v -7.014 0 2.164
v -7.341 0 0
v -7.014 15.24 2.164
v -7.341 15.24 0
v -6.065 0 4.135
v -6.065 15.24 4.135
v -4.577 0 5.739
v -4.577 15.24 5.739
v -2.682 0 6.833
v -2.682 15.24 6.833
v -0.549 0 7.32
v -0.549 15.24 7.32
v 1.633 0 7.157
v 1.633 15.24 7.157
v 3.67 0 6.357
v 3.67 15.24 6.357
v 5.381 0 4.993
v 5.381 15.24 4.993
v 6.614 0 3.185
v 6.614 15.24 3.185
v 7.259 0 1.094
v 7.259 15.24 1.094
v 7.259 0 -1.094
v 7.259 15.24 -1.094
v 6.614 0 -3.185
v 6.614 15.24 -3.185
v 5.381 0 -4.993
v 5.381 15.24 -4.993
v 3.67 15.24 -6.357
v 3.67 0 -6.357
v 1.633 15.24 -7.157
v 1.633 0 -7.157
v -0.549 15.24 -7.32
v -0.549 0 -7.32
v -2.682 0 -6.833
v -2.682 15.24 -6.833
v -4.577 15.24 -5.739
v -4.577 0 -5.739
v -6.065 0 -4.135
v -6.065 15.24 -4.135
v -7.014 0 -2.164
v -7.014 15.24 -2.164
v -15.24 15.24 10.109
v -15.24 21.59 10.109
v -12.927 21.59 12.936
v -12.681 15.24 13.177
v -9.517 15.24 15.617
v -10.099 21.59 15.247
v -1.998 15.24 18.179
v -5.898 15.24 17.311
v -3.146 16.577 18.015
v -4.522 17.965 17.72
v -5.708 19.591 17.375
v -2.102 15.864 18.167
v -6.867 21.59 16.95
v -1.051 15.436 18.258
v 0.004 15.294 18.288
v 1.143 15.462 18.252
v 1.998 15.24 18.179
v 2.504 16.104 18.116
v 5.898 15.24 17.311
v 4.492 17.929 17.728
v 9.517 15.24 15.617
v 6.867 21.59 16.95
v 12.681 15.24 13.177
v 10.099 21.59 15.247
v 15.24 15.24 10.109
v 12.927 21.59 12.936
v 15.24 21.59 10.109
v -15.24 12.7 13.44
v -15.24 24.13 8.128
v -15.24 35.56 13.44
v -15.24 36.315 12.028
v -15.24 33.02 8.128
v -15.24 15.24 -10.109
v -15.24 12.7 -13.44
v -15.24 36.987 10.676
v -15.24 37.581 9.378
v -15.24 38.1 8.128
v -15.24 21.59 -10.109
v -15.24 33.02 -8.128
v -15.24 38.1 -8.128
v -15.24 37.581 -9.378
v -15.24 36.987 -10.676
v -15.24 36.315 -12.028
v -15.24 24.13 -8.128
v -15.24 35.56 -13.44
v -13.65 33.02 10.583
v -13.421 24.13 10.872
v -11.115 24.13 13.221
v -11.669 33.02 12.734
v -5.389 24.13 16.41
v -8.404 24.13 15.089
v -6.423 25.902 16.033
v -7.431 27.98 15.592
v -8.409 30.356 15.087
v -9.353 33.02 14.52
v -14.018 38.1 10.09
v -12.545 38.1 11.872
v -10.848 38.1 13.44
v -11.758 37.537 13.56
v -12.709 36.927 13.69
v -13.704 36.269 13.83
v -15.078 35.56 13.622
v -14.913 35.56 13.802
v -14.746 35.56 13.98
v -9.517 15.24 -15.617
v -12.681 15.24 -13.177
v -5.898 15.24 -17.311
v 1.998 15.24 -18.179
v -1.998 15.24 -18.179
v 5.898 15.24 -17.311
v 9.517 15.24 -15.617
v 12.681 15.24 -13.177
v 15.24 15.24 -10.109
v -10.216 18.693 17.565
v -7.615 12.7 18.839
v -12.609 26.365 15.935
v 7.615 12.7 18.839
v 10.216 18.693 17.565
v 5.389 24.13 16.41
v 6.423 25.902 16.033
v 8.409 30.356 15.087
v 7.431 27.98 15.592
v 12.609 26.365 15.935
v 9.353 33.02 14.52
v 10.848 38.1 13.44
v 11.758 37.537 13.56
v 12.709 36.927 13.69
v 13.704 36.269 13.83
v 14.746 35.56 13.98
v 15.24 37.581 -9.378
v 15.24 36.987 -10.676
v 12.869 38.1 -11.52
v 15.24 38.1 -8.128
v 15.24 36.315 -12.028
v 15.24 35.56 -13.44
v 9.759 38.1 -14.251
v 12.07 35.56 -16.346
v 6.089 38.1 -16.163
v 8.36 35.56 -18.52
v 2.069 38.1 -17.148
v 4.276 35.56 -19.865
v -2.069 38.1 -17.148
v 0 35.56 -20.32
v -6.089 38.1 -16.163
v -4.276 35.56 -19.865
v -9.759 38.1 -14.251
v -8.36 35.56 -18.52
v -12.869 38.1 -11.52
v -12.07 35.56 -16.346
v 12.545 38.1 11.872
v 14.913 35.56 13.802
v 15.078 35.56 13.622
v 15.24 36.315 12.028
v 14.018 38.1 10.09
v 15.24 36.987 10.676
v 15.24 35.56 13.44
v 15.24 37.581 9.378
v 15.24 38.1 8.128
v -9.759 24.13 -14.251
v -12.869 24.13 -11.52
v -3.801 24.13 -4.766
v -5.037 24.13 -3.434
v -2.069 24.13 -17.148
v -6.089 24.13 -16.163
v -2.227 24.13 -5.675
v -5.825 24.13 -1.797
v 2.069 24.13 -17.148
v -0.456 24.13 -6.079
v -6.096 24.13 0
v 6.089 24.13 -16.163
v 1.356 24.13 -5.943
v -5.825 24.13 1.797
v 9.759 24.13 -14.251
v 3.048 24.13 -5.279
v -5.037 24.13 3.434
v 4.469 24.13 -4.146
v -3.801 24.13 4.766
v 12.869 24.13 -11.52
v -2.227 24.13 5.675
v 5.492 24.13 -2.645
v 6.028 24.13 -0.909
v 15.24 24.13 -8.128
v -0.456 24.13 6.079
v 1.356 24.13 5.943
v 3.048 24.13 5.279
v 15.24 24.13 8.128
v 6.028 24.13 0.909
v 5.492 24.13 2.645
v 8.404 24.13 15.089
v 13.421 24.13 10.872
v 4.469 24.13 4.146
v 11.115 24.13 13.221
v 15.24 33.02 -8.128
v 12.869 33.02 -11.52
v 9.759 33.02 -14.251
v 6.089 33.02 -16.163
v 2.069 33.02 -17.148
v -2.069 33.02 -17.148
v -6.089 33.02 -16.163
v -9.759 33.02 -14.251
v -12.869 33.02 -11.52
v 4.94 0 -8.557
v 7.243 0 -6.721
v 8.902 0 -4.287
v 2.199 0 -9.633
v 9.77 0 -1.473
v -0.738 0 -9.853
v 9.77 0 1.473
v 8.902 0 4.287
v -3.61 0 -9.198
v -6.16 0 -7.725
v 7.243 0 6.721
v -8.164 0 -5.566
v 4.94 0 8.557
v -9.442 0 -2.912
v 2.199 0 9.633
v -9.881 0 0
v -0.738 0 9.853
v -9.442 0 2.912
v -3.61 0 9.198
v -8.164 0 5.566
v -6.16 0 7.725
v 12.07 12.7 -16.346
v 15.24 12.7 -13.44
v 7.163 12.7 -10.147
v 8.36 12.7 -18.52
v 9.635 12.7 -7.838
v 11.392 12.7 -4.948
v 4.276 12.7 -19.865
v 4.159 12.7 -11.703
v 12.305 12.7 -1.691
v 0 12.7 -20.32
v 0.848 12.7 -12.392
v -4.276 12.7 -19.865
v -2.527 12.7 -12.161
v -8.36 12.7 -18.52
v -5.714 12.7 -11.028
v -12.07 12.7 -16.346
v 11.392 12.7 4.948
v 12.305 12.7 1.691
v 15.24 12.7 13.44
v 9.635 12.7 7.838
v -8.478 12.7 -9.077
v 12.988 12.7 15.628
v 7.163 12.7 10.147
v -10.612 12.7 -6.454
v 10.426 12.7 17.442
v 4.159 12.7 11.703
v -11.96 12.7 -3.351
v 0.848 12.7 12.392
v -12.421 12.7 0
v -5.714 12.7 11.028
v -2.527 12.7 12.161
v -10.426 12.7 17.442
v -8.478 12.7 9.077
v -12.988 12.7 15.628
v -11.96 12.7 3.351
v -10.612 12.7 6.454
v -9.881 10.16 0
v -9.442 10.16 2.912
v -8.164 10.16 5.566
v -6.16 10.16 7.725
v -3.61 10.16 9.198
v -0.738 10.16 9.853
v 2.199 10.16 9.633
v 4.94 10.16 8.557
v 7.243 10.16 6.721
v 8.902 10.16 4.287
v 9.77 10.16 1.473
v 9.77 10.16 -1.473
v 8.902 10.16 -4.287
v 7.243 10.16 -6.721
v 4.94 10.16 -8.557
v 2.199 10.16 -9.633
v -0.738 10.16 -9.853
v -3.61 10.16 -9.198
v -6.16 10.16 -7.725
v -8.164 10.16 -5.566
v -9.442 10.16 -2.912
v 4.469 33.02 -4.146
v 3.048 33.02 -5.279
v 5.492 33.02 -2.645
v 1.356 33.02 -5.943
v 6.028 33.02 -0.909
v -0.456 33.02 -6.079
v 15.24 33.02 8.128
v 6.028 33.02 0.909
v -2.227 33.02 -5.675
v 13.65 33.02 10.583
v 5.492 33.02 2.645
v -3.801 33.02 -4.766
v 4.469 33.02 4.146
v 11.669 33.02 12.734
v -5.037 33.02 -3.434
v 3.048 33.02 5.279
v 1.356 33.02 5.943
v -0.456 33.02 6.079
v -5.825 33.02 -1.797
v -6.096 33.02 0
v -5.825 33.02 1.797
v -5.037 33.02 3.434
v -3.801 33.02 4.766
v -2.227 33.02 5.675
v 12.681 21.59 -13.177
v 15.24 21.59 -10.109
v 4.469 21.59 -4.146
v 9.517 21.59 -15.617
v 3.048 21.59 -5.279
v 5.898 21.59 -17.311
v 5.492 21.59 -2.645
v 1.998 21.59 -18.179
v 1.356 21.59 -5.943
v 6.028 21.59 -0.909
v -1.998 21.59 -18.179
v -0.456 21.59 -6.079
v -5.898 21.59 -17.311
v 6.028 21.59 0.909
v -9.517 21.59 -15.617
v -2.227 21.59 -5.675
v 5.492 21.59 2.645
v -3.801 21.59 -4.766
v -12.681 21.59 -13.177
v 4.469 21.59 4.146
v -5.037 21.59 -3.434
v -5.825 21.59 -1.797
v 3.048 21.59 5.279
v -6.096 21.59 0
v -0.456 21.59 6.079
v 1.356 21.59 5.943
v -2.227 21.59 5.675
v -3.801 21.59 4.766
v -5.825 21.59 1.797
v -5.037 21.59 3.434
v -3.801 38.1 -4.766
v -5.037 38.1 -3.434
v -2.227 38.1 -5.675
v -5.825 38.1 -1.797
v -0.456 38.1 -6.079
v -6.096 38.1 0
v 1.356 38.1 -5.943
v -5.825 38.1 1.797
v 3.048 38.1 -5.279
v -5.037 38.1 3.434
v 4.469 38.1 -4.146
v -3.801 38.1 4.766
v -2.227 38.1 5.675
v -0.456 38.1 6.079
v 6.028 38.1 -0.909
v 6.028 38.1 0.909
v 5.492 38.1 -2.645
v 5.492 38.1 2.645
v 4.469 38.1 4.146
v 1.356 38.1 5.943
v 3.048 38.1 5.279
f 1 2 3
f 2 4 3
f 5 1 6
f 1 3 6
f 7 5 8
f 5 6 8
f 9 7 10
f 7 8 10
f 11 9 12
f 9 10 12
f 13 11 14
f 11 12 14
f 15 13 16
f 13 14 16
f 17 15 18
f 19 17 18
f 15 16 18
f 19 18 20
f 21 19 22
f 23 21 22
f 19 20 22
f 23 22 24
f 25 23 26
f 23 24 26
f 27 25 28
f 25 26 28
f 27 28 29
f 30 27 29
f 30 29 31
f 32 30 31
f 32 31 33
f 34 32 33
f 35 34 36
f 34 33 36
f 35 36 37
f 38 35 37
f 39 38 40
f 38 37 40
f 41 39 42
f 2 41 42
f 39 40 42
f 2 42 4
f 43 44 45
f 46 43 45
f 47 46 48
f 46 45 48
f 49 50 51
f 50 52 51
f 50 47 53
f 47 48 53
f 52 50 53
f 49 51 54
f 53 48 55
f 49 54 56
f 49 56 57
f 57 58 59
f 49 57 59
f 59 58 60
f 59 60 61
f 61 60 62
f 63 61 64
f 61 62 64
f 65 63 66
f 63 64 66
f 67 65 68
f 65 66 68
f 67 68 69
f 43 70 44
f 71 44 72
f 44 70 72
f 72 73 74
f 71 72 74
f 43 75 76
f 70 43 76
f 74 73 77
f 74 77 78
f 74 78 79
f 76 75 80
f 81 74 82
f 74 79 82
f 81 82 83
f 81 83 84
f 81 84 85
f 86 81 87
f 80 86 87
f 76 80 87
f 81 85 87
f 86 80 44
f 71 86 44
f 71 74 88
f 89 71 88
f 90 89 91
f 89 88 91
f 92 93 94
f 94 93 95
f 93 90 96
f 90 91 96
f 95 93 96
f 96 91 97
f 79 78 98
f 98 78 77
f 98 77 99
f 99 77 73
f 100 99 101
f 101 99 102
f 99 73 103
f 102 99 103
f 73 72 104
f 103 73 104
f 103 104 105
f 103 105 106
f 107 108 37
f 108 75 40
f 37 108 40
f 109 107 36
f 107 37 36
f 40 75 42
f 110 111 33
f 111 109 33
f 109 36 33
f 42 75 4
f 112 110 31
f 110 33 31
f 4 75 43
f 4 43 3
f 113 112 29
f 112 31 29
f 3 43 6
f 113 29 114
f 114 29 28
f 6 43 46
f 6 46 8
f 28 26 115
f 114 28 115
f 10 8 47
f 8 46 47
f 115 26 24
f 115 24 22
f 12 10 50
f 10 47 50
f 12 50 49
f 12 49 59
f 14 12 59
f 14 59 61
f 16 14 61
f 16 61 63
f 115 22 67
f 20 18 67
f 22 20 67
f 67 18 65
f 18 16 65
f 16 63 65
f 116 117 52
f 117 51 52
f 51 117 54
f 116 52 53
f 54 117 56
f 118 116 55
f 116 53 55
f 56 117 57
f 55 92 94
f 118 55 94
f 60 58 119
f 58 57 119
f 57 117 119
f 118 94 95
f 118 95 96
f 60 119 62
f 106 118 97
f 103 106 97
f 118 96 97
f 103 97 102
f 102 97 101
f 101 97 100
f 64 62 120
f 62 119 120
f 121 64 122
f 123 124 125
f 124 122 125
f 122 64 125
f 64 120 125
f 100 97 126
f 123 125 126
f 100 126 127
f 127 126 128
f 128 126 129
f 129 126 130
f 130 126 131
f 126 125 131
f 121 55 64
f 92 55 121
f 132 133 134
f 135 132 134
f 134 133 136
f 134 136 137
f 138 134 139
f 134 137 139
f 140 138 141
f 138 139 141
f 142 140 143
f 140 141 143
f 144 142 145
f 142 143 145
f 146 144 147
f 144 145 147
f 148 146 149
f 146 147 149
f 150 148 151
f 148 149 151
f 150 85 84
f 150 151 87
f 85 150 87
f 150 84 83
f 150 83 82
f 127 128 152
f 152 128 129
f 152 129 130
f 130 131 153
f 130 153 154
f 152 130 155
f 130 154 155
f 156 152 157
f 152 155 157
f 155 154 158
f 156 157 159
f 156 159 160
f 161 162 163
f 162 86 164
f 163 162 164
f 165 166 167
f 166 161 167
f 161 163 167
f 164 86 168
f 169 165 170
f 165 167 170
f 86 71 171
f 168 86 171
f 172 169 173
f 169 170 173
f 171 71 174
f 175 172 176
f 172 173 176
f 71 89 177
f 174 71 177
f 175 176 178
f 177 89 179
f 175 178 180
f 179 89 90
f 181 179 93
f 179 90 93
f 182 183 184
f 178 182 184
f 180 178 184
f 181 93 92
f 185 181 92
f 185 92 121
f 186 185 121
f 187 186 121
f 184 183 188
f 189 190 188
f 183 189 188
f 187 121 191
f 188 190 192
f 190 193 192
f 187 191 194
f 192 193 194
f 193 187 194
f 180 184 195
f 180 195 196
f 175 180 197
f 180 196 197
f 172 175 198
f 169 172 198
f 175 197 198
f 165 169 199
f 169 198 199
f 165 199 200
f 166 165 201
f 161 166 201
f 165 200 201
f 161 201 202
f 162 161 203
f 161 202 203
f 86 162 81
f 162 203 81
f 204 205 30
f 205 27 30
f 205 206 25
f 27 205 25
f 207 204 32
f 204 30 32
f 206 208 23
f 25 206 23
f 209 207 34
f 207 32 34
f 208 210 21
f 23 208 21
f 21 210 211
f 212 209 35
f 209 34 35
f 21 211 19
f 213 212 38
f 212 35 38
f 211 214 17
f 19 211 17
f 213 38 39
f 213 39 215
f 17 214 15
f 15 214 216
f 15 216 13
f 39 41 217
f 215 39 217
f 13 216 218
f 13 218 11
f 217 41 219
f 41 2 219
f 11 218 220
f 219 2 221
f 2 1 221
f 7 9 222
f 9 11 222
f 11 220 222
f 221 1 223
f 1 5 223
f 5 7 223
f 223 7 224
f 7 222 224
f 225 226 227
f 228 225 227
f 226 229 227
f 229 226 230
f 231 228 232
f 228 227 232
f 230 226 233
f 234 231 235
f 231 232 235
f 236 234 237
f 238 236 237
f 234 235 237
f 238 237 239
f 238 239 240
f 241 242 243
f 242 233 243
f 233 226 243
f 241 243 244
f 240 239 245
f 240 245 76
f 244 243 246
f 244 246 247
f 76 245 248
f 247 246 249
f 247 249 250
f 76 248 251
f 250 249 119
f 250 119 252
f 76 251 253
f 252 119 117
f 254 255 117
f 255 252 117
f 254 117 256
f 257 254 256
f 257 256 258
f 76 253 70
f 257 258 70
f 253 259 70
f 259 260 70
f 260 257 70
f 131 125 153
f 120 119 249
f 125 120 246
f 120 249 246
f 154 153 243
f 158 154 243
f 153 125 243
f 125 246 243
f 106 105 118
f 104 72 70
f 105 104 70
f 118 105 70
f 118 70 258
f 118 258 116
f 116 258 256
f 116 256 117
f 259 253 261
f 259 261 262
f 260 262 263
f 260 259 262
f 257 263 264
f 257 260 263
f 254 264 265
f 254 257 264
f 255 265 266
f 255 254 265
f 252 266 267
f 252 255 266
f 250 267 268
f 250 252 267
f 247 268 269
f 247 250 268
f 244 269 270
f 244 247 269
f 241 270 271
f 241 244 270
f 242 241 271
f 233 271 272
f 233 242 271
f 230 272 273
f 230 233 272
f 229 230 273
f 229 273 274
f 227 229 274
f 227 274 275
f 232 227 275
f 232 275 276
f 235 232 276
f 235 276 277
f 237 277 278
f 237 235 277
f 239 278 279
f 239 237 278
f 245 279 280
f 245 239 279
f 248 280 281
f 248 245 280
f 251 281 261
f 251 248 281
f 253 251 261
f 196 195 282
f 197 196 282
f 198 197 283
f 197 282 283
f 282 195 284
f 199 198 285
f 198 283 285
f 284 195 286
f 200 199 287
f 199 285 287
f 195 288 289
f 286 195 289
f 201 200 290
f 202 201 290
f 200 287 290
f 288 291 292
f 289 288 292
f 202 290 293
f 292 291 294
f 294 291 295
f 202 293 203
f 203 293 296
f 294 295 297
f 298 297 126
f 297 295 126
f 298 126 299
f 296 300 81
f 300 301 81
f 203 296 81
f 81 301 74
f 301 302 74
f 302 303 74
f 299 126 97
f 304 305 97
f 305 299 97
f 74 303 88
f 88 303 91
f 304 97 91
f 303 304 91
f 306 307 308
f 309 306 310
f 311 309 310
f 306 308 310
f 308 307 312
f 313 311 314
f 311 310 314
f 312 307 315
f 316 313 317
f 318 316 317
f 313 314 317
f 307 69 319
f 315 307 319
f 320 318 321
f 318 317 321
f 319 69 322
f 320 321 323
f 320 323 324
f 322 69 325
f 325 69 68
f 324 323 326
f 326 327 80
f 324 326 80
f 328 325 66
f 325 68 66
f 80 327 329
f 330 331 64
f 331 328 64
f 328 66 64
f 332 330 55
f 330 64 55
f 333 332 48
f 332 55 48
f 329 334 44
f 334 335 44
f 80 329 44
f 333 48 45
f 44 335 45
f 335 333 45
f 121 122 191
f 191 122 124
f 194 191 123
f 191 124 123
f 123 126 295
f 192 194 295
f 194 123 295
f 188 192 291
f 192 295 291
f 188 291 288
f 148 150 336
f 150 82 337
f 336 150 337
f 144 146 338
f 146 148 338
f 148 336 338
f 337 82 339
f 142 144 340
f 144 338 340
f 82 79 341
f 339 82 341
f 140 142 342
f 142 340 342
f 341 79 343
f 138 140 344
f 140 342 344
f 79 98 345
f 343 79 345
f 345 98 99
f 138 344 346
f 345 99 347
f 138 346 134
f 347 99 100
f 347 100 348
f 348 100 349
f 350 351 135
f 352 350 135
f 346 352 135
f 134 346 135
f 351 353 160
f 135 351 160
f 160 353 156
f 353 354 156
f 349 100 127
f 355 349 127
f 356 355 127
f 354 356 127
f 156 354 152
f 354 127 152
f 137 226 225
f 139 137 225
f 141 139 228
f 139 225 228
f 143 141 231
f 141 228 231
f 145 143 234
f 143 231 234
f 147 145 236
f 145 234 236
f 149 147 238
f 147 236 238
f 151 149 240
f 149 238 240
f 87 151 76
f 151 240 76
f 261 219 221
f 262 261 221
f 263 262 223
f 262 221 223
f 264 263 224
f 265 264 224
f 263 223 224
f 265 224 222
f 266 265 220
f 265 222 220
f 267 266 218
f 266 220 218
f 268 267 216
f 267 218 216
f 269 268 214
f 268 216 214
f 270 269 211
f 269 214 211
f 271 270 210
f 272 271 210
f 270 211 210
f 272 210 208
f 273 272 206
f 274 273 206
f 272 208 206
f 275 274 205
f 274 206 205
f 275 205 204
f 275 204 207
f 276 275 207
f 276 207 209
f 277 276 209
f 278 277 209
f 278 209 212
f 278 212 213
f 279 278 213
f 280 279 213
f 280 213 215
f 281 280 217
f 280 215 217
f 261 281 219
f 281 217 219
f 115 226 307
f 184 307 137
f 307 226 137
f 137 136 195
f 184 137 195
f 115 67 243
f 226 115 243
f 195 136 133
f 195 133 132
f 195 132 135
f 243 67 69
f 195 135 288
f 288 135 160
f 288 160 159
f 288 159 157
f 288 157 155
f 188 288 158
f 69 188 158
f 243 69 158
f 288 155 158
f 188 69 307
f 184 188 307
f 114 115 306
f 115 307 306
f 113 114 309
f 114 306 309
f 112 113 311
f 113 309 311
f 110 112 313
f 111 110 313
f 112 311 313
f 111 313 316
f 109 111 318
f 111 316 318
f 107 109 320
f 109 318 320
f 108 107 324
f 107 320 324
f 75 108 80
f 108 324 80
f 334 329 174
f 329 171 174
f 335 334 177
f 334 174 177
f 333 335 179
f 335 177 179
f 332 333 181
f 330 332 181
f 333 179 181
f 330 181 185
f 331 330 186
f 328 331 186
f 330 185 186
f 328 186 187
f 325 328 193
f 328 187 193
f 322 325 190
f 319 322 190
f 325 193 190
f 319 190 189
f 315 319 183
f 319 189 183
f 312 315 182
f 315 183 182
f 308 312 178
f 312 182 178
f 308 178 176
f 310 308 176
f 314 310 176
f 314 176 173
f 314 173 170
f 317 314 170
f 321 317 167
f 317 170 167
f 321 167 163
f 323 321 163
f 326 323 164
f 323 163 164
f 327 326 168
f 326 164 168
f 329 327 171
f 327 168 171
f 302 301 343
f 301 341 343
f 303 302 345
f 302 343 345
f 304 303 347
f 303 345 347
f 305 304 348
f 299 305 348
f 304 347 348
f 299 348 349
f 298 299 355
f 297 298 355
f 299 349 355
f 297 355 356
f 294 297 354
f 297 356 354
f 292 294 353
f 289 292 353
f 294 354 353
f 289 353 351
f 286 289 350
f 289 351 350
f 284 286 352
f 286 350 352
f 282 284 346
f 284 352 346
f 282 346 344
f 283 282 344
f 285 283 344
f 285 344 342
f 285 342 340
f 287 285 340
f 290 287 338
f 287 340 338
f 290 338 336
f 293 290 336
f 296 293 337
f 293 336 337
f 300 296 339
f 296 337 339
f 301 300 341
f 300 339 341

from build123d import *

# Parameters (mm, degrees)
F3_DEPTH = 25.4
F5_DEPTH = 30.481
F6_SIZE  = 2.54


with BuildPart() as f1:
    # F0 (on Top) → F1 (revolve)
    with BuildSketch(Plane.XY):
        Polygon((-9.8806, 0), (-7.3406, 0), (-7.3406, 15.24), (-18.288, 15.24), (-18.288, 21.59), (-6.096, 21.59), (-6.096, 24.13), (-17.272, 24.13), (-17.272, 33.02), (-6.096, 33.02), (-6.096, 38.1), (-17.272, 38.1), (-20.32, 35.56), (-20.32, 12.7), (-9.8806, 12.7), align=None)
    revolve(axis=Axis((0, 12.155764, 0), (0, 1, 0)))

    # F2 (on face) → F3 (cut)
    with BuildSketch(Plane(origin=(0, 38.1, 0), x_dir=(-1, 0, 0), z_dir=(0, 1, 0))):
        with BuildLine():
            Line((-15.24, -13.440417), (-15.24, 13.440417))
            ThreePointArc((-15.24, 13.440417), (-20.32, 0), (-15.24, -13.440417))
        make_face()
        with BuildLine():
            ThreePointArc((15.24, -13.440417), (20.32, 0), (15.24, 13.440417))
            Line((15.24, 13.440417), (15.24, -13.440417))
        make_face()
    extrude(amount=-F3_DEPTH, mode=Mode.SUBTRACT)

    # F4 (on face) → F5 (cut, through all)
    with BuildSketch(Plane.YZ.offset(15.24)):
        Polygon((12.7, 25.189353), (12.7, 18.839353), (38.1, 13.440417), (38.1, 25.189353), align=None)
    extrude(amount=-F5_DEPTH, mode=Mode.SUBTRACT)

    # F6
    f6_edges = [f1.edges().sort_by_distance(p)[0] for p in [
        (9.8806, 12.7, 0),
    ]]
    chamfer(f6_edges, length=F6_SIZE)


solid = f1.part
